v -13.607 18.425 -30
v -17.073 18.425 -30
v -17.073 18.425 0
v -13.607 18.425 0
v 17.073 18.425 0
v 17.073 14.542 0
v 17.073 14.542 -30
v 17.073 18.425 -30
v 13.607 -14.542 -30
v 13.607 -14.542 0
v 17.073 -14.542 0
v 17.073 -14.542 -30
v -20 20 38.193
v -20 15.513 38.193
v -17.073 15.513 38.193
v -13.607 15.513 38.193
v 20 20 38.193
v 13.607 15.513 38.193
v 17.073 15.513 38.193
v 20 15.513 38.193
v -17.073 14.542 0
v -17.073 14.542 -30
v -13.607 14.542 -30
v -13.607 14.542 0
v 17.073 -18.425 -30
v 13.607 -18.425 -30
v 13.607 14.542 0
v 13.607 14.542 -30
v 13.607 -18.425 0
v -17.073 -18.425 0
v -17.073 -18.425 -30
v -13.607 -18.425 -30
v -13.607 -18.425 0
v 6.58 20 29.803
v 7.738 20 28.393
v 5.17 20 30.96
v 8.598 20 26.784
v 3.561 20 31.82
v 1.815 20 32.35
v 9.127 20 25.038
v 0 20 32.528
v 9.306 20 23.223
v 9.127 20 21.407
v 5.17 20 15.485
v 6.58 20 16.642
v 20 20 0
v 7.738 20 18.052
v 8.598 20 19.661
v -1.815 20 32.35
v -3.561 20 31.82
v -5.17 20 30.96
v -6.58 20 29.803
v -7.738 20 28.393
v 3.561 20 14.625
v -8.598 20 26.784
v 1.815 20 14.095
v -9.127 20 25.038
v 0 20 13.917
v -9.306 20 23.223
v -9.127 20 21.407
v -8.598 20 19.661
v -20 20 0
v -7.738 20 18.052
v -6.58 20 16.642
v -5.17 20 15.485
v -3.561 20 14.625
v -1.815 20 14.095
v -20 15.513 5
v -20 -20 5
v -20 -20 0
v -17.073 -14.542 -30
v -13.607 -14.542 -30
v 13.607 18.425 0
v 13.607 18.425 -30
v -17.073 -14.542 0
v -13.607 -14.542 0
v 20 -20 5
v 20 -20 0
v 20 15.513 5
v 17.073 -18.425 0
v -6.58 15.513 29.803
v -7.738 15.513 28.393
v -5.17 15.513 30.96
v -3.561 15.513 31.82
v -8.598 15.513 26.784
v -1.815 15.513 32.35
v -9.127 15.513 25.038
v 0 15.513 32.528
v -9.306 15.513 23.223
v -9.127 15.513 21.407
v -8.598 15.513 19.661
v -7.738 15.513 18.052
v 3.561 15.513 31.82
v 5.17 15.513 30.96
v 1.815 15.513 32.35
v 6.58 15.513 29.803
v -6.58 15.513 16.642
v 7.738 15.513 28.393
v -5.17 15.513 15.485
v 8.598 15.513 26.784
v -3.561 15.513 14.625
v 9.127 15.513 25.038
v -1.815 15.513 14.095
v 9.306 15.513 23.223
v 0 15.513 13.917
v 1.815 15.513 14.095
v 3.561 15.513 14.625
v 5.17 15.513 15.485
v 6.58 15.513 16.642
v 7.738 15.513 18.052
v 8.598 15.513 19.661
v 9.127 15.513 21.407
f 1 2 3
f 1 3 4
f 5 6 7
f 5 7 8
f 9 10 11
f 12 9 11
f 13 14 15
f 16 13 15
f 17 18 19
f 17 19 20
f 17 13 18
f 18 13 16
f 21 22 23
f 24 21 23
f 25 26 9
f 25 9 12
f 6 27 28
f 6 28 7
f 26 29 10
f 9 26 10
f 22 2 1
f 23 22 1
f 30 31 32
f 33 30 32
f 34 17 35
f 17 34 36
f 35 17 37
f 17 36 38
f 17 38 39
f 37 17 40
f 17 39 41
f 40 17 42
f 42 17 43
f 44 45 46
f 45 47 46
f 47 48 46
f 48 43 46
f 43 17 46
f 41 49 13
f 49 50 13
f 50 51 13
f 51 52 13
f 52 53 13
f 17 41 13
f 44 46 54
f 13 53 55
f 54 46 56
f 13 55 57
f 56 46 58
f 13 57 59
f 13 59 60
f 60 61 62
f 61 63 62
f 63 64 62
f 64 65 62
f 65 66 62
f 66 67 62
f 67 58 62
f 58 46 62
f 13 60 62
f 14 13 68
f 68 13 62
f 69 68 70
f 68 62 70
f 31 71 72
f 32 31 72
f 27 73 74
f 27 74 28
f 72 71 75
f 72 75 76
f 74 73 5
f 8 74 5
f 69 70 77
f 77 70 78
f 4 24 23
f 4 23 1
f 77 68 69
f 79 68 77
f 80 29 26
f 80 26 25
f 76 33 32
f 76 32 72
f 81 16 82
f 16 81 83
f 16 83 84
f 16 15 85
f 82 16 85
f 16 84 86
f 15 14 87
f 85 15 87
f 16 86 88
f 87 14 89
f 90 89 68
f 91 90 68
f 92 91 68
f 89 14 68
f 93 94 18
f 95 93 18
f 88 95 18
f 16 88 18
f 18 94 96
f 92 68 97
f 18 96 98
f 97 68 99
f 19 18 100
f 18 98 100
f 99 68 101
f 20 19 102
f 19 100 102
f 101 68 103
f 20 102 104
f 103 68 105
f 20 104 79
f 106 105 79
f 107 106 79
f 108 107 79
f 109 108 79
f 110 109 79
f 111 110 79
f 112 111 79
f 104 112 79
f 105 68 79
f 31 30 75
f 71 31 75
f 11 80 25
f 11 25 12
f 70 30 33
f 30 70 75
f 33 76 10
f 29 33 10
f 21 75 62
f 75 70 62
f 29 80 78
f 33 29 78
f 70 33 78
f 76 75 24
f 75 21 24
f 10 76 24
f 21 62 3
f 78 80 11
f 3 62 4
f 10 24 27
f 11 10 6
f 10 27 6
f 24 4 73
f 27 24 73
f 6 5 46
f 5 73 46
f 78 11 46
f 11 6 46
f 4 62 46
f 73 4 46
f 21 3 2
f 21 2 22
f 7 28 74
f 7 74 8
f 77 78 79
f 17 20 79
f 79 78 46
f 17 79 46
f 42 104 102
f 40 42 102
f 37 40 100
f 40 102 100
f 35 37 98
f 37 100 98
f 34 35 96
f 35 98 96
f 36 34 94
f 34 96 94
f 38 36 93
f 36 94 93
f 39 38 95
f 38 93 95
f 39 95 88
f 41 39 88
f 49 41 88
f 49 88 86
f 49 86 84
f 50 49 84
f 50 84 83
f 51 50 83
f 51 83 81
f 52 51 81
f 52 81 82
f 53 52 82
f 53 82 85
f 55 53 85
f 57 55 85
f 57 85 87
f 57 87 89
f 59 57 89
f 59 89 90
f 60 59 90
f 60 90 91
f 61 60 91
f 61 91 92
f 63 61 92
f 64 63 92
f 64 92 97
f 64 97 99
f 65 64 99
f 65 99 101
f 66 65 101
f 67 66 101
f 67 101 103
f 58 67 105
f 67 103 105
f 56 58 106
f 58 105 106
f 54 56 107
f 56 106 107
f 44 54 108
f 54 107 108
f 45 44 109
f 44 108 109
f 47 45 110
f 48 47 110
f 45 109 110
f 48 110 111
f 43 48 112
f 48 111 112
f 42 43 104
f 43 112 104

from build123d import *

# Parameters (mm, degrees)
F0_W     = 3.4663490951
F0_H     = 3.8823140785
F0_H_2   = 2.9117353261
F0_H_3   = 0.9705787525
F1_DEPTH = 5
F2_DEPTH = 30
F3_DEPTH = 38.19281
F4_R     = 9.3059115505
F5_DEPTH = 4.488162903


with BuildPart() as f1:
    # F0 (on Top) → F1 (new body)
    with BuildSketch(Plane.XY):
        Polygon((20, -20), (20, 15.512837097), (17.0732010156, 15.512837097), (17.0732010156, 14.5422583446), (13.6068519205, 14.5422583446), (13.6068519205, 15.512837097), (-13.6068519205, 15.512837097), (-13.6068519205, 14.5422583446), (-17.0732010156, 14.5422583446), (-17.0732010156, 15.512837097), (-20, 15.512837097), (-20, -20), align=None)
        with Locations((-15.340026468, -16.4834153838)):
            Rectangle(F0_W, F0_H, mode=Mode.SUBTRACT)
        with Locations((15.340026468, -16.4834153838)):
            Rectangle(F0_W, F0_H, mode=Mode.SUBTRACT)
        Polygon((20, 15.512837097), (20, 20), (-20, 20), (-20, 15.512837097), (-17.0732010156, 15.512837097), (-17.0732010156, 18.4245724231), (-13.6068519205, 18.4245724231), (-13.6068519205, 15.512837097), (13.6068519205, 15.512837097), (13.6068519205, 18.4245724231), (17.0732010156, 18.4245724231), (17.0732010156, 15.512837097), align=None)
        with Locations((15.340026468, -16.4834153838)):
            Rectangle(F0_W, F0_H)
        with Locations((-15.340026468, -16.4834153838)):
            Rectangle(F0_W, F0_H)
        with Locations((15.340026468, 16.9687047601)):
            Rectangle(F0_W, F0_H_2)
        with Locations((-15.340026468, 16.9687047601)):
            Rectangle(F0_W, F0_H_2)
        with Locations((15.340026468, 15.0275477208)):
            Rectangle(F0_W, F0_H_3)
        with Locations((-15.340026468, 15.0275477208)):
            Rectangle(F0_W, F0_H_3)
    extrude(amount=F1_DEPTH)

    # F0 (on Top) → F2 (join)
    with BuildSketch(Plane.XY):
        with Locations((15.340026468, -16.4834153838)):
            Rectangle(F0_W, F0_H)
        with Locations((-15.340026468, -16.4834153838)):
            Rectangle(F0_W, F0_H)
        with Locations((-15.340026468, 16.9687047601)):
            Rectangle(F0_W, F0_H_2)
        with Locations((15.340026468, 16.9687047601)):
            Rectangle(F0_W, F0_H_2)
        with Locations((15.340026468, 15.0275477208)):
            Rectangle(F0_W, F0_H_3)
        with Locations((-15.340026468, 15.0275477208)):
            Rectangle(F0_W, F0_H_3)
    extrude(amount=-F2_DEPTH)

    # F0 (on Top) → F3 (join)
    with BuildSketch(Plane.XY):
        Polygon((20, 15.512837097), (20, 20), (-20, 20), (-20, 15.512837097), (-17.0732010156, 15.512837097), (-17.0732010156, 18.4245724231), (-13.6068519205, 18.4245724231), (-13.6068519205, 15.512837097), (13.6068519205, 15.512837097), (13.6068519205, 18.4245724231), (17.0732010156, 18.4245724231), (17.0732010156, 15.512837097), align=None)
        with Locations((-15.340026468, 16.9687047601)):
            Rectangle(F0_W, F0_H_2)
        with Locations((15.340026468, 16.9687047601)):
            Rectangle(F0_W, F0_H_2)
    extrude(amount=F3_DEPTH)

    # F4 (on face) → F5 (cut, through all)
    with BuildSketch(Plane.XZ.offset(-15.512837097)):
        with Locations((0, 23.2225228101)):
            Circle(F4_R)
    extrude(amount=-F5_DEPTH, mode=Mode.SUBTRACT)


solid = f1.part
